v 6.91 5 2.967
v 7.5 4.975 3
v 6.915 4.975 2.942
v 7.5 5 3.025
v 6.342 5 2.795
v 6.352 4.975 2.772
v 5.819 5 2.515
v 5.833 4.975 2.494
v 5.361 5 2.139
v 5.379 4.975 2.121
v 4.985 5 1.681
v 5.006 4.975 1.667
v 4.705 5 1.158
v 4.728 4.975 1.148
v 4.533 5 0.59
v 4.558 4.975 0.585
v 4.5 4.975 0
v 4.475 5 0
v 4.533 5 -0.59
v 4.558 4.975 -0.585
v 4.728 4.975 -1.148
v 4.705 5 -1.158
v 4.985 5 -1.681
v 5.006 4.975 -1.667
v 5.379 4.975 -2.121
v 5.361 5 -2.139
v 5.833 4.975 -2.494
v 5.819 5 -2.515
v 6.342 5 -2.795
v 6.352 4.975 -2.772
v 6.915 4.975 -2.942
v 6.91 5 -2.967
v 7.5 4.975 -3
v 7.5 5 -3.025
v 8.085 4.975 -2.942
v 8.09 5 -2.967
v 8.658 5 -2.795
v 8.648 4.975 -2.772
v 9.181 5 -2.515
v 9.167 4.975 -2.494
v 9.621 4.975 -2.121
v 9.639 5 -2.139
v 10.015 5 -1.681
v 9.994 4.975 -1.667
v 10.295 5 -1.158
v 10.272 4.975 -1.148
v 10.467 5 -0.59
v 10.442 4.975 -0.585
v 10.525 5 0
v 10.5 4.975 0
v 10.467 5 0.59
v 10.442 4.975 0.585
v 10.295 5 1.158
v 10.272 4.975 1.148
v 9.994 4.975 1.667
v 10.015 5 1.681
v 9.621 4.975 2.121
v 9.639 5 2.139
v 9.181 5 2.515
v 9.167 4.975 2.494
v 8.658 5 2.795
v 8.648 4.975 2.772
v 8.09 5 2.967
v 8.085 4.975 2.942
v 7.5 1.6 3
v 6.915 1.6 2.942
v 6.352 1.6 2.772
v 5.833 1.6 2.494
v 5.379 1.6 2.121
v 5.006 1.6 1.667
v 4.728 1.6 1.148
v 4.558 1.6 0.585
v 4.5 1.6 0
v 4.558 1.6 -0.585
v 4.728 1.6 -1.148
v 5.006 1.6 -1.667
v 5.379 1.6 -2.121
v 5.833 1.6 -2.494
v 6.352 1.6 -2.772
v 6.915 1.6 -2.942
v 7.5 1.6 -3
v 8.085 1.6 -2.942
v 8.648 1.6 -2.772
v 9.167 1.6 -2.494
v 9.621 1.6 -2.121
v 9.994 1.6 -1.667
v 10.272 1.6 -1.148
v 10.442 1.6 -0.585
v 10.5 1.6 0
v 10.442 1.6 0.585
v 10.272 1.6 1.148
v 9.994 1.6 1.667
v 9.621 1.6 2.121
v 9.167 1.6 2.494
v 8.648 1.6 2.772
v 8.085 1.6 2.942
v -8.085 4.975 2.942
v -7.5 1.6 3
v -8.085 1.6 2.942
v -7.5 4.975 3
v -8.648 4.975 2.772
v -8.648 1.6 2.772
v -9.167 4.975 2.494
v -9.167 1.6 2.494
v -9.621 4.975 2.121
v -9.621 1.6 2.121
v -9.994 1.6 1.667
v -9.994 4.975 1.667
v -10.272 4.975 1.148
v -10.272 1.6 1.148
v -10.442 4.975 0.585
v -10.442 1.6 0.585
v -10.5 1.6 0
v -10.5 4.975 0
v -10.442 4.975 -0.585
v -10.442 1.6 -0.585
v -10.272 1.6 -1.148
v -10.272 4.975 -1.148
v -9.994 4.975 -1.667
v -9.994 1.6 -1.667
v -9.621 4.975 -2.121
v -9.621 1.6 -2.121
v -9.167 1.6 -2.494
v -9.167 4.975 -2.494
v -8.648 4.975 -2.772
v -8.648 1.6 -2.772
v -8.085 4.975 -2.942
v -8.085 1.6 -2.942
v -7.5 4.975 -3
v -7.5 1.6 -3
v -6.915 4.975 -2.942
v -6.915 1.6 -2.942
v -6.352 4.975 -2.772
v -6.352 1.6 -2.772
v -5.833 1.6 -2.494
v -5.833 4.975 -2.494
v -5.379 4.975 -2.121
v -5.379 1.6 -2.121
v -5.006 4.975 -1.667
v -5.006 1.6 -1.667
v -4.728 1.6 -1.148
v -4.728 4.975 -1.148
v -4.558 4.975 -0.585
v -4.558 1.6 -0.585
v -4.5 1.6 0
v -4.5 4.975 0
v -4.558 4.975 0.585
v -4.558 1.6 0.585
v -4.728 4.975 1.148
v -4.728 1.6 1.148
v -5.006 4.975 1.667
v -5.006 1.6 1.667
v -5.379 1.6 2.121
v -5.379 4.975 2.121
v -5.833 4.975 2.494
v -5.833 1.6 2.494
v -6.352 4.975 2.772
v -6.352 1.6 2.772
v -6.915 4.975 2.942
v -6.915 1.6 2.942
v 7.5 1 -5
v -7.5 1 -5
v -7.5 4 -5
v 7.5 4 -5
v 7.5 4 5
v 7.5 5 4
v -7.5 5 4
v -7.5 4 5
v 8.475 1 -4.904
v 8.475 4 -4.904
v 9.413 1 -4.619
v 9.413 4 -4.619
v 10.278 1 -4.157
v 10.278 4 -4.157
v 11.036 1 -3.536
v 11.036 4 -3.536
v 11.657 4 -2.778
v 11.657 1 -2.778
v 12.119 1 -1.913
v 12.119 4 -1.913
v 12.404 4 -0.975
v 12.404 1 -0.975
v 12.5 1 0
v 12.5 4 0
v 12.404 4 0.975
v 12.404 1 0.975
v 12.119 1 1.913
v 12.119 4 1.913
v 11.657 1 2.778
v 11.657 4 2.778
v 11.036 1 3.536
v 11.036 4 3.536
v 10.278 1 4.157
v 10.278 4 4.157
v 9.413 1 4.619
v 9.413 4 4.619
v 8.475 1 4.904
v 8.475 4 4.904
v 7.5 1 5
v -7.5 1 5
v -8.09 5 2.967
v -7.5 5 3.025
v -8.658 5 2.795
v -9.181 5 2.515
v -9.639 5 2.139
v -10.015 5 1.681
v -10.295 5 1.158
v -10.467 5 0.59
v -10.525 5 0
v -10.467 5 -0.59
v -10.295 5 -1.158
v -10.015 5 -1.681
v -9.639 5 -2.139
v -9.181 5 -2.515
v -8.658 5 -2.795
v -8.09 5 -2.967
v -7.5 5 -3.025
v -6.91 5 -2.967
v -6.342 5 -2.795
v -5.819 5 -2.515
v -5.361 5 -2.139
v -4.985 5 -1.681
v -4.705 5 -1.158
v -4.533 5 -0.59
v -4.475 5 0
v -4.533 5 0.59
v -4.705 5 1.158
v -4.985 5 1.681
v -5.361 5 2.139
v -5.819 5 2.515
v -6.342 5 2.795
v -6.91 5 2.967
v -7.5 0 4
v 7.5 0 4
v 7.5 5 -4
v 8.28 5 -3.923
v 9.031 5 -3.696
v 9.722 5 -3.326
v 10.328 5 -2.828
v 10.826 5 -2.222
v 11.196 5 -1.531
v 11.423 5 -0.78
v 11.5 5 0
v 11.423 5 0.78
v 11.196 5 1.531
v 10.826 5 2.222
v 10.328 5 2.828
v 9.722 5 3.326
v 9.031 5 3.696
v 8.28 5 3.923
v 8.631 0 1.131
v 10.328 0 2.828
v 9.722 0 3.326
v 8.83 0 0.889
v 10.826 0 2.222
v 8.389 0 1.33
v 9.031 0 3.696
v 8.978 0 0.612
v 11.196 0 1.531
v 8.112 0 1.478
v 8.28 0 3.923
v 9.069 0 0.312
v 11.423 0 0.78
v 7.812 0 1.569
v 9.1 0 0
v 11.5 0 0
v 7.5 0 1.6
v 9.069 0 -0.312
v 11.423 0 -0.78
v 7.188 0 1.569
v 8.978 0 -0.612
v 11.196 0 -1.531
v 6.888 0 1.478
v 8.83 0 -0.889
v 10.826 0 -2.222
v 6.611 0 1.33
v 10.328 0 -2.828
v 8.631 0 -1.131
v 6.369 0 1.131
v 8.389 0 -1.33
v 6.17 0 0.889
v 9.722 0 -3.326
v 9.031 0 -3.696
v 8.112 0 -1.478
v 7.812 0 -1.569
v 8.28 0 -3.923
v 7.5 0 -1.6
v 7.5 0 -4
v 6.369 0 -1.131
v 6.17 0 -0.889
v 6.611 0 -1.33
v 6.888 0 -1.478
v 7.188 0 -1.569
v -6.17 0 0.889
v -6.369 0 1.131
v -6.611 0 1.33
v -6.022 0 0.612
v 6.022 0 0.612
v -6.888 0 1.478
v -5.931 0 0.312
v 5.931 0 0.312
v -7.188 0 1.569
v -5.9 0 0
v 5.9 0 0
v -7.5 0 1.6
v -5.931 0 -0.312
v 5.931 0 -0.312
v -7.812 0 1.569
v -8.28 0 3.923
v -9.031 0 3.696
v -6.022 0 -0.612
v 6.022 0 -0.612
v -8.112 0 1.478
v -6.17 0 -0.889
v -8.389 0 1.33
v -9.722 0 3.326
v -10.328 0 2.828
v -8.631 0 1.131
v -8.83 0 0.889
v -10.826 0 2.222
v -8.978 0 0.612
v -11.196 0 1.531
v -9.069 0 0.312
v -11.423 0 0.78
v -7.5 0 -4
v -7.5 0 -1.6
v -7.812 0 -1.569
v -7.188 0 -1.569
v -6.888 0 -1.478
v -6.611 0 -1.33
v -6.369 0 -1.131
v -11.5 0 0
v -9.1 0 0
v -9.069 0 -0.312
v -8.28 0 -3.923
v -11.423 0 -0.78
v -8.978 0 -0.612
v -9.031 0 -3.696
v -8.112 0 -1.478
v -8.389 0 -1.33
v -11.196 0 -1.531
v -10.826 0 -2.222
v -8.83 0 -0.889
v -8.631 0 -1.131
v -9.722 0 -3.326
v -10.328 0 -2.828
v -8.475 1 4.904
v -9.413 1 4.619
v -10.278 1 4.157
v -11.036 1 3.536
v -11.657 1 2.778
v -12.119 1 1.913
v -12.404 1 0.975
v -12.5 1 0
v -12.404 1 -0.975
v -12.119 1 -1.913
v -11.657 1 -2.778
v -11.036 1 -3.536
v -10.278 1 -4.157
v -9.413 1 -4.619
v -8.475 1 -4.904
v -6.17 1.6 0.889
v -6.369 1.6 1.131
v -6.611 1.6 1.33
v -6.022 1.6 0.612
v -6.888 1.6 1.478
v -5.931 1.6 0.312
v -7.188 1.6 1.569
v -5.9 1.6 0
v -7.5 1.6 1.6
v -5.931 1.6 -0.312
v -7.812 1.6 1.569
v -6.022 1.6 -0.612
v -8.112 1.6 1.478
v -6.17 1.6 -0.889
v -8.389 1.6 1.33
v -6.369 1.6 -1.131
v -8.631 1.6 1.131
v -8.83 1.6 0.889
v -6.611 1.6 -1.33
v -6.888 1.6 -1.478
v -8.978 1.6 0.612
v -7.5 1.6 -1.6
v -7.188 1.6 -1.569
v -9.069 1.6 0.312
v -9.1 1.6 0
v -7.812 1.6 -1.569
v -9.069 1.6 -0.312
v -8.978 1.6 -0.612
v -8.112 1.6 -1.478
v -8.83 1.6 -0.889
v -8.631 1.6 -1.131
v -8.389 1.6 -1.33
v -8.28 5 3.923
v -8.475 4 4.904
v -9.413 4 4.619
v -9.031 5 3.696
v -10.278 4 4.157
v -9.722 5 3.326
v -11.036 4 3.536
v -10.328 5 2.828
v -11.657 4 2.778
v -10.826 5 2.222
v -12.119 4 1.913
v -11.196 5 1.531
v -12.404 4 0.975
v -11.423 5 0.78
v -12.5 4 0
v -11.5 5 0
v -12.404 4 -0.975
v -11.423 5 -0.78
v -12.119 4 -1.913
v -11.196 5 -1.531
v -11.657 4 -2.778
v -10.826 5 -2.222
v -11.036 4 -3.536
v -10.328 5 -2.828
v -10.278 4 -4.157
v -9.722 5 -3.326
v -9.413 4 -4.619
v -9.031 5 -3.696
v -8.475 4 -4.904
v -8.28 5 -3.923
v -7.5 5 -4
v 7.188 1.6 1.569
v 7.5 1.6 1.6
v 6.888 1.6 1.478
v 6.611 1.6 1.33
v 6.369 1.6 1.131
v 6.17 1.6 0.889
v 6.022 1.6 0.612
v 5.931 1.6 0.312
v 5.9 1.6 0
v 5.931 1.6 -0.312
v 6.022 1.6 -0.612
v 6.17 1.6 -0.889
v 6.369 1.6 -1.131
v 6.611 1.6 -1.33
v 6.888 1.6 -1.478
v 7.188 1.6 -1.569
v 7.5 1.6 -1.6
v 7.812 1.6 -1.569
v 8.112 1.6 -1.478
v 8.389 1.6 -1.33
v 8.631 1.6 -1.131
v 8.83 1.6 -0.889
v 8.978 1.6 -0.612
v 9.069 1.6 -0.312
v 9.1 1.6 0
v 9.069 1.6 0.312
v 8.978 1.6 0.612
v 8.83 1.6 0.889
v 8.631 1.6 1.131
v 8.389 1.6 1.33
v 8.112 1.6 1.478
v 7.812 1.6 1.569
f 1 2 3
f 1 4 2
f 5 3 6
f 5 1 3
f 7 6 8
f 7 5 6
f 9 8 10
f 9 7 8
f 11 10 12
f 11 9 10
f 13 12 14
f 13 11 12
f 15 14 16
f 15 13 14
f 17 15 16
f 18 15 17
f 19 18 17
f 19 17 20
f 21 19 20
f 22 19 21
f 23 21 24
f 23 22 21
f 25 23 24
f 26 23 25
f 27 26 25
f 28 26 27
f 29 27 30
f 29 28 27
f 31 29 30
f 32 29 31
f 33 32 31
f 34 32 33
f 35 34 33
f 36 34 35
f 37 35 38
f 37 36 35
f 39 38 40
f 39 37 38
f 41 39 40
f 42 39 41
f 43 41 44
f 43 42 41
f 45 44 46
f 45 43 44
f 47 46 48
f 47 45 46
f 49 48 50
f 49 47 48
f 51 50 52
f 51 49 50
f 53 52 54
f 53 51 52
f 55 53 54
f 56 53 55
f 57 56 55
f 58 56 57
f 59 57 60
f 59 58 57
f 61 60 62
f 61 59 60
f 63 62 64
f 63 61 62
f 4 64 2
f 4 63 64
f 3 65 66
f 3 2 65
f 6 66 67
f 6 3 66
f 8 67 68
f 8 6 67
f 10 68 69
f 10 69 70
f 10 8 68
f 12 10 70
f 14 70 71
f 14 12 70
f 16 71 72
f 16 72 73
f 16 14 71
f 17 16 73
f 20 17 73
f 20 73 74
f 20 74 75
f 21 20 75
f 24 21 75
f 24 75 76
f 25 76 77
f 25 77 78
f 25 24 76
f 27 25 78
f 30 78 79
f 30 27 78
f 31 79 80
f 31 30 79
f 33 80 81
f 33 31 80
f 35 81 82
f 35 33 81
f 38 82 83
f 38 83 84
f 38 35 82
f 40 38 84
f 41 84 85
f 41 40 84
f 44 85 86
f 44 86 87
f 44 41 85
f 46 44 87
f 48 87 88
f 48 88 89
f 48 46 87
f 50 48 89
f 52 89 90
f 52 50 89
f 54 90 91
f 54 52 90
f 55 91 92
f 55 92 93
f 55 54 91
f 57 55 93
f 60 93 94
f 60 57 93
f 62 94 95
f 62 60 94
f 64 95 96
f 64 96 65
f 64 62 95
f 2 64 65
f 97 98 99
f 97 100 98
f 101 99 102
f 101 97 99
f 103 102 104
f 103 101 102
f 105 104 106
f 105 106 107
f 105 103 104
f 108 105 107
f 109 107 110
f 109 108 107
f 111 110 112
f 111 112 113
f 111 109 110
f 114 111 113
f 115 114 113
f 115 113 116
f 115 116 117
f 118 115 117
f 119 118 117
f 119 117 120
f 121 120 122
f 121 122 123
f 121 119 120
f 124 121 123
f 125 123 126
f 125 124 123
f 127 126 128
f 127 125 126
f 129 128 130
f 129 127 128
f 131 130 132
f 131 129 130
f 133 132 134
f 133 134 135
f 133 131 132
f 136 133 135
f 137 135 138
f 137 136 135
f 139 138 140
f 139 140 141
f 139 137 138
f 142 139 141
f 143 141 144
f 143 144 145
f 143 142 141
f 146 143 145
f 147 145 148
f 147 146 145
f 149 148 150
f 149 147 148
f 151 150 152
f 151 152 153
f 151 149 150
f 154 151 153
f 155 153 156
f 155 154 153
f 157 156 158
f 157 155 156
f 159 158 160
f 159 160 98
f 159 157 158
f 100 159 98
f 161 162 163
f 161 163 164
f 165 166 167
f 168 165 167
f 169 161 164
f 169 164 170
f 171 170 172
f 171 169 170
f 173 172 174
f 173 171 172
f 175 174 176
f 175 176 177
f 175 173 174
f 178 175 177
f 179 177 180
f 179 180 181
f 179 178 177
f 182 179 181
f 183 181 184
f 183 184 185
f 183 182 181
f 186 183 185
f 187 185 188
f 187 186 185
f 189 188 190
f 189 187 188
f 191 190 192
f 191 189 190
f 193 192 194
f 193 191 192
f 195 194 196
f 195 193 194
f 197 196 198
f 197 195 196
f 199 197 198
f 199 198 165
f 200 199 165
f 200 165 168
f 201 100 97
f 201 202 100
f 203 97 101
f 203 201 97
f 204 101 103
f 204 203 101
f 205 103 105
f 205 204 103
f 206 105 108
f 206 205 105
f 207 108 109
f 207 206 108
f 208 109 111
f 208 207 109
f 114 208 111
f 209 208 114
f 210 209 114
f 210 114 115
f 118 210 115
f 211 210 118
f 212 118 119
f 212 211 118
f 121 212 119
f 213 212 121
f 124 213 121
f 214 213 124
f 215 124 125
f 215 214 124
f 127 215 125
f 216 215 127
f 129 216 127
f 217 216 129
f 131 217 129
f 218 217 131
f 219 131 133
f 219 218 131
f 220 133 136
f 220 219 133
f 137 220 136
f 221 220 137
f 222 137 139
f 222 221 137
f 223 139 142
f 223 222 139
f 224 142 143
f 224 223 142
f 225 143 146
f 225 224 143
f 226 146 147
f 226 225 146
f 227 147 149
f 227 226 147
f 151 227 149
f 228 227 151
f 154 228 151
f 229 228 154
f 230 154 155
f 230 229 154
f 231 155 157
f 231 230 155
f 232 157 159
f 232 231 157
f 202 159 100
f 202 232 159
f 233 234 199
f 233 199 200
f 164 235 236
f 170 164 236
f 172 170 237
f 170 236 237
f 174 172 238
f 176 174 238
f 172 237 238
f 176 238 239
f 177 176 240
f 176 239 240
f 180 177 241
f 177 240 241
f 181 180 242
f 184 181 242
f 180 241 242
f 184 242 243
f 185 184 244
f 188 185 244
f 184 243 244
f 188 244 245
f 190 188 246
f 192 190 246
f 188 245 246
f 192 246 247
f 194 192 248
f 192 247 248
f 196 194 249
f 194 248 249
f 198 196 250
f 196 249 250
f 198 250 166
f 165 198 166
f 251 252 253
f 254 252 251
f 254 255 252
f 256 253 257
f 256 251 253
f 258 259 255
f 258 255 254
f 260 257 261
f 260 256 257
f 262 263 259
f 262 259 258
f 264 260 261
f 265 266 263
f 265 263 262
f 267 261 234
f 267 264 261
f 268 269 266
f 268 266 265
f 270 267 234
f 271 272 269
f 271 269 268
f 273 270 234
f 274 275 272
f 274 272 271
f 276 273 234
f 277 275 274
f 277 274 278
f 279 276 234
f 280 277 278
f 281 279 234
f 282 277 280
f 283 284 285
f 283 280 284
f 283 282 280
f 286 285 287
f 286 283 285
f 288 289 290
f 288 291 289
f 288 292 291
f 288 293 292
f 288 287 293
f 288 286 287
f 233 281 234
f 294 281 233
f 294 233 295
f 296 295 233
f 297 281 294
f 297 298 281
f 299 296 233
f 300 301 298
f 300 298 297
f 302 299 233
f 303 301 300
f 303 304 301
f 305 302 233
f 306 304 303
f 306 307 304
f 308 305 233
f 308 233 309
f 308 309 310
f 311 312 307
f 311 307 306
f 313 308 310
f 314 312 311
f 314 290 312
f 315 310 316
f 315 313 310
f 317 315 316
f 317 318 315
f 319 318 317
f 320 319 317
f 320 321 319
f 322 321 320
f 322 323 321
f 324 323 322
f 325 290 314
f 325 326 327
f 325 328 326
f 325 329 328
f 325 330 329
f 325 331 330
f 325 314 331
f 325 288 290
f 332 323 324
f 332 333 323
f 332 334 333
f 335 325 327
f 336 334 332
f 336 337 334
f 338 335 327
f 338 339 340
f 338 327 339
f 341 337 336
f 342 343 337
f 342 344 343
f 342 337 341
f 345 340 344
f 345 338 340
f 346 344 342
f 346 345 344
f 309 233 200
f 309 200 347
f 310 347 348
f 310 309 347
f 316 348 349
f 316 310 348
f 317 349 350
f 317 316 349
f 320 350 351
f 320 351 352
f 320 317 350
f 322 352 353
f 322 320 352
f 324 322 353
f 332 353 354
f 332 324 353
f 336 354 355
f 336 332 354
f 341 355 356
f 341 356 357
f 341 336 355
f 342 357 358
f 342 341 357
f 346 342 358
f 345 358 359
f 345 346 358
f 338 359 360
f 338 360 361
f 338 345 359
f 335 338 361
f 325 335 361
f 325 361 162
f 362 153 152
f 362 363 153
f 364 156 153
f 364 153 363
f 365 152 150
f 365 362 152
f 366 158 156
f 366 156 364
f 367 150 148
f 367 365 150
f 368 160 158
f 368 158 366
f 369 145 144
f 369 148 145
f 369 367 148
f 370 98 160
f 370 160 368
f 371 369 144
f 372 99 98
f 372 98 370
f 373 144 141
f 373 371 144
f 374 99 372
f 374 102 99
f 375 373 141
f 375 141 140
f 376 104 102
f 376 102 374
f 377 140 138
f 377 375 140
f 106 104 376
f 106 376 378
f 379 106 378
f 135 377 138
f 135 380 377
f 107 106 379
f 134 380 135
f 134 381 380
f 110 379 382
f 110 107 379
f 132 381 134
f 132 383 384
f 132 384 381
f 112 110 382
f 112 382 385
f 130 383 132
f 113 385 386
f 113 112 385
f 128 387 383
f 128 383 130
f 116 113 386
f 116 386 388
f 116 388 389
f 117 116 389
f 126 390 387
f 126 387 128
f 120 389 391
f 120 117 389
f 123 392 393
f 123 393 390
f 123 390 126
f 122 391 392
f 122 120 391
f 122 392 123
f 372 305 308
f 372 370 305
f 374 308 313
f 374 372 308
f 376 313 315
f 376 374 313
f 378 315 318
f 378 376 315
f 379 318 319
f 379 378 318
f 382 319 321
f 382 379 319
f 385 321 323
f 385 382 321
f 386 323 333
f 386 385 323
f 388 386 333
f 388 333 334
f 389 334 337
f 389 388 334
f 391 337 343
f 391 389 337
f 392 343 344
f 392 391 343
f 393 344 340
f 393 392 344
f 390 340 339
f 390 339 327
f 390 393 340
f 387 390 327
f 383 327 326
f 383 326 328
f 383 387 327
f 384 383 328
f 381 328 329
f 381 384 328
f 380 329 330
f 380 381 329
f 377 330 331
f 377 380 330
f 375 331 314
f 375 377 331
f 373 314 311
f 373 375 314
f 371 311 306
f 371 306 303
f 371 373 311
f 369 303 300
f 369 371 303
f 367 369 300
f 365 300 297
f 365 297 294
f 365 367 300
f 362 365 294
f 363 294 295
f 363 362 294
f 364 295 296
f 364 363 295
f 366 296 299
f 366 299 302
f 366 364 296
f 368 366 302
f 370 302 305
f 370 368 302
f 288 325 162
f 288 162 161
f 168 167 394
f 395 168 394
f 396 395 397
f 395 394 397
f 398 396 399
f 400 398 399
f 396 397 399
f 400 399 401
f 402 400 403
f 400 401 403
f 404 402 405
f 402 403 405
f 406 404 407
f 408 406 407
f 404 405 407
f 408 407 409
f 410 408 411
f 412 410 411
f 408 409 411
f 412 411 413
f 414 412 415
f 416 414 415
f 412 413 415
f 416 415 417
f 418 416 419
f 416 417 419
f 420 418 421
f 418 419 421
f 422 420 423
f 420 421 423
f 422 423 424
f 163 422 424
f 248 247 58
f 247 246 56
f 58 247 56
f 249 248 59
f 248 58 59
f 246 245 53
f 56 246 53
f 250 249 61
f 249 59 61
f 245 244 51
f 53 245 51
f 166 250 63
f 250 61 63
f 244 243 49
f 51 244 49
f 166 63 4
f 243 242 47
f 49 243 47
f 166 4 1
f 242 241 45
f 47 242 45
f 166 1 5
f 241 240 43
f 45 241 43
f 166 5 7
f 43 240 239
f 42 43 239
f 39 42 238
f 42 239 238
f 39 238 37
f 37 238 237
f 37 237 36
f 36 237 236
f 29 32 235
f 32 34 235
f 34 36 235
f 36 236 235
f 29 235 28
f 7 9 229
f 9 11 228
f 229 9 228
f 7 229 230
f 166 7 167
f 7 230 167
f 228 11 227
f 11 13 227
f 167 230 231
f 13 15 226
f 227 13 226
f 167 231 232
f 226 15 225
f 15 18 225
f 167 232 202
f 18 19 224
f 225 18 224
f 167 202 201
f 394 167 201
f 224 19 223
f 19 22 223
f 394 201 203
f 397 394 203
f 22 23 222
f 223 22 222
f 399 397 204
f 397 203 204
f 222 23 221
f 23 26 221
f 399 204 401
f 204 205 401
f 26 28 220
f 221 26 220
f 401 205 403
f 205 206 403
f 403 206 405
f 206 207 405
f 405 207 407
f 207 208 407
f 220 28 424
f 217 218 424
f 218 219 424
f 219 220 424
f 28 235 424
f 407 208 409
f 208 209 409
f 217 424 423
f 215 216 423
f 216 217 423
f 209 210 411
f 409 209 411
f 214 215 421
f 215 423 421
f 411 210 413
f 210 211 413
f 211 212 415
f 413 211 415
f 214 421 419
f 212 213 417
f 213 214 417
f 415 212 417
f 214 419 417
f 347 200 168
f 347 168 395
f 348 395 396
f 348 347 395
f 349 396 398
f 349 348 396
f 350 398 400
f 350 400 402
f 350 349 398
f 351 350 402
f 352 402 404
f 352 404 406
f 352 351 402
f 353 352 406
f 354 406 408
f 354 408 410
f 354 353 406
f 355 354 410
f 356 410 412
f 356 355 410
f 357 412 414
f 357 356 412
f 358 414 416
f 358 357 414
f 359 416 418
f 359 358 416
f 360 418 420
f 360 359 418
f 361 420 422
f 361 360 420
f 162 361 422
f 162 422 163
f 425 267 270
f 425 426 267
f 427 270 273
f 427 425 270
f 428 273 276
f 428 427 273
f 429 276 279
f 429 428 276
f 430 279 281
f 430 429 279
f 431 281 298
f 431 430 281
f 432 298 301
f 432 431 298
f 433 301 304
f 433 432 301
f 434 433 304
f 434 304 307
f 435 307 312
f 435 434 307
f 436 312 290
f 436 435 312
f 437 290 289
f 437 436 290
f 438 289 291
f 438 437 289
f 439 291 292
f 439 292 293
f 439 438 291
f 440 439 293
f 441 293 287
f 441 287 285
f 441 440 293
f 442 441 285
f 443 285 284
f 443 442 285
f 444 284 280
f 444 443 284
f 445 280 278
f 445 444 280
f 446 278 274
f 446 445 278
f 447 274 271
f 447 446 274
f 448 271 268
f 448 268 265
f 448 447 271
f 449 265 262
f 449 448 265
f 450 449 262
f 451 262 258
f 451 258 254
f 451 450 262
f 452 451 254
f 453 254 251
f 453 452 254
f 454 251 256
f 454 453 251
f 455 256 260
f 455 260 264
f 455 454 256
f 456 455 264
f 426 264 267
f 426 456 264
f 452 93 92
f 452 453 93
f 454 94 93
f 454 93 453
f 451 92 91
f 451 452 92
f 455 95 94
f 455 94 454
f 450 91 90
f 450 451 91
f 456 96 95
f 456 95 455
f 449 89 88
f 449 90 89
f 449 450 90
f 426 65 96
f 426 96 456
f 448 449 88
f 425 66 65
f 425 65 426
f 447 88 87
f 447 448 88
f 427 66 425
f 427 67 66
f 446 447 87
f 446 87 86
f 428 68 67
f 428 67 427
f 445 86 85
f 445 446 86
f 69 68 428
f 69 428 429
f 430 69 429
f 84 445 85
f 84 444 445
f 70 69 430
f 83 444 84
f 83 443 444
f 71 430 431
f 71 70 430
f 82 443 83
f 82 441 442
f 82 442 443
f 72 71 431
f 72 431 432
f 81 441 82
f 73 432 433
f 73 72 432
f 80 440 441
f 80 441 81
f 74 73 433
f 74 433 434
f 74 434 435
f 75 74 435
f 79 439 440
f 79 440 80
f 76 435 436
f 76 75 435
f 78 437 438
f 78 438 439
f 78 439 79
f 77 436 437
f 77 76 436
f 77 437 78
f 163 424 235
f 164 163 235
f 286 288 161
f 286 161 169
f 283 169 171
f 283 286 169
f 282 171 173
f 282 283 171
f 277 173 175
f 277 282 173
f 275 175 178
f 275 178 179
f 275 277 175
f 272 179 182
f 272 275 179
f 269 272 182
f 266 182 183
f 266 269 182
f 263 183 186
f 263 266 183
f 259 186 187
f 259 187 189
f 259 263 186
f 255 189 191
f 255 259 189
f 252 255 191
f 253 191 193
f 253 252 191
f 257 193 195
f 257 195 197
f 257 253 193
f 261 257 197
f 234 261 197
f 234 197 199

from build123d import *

# Parameters (mm, degrees)
BOSS_EXTRUDE1_DEPTH                          = 5
CBORE_FOR_M3_HEXAGON_SOCKET_HEAD_CAP_2_COUNT = 2
CBORE_FOR_M3_HEXAGON_SOCKET_HEAD_CAP_2_PITCH = 15
CHAMFER1_SIZE                                = 1


with BuildPart() as part:
    # Sketch1 → Boss-Extrude1 (new body)
    with BuildSketch(Plane(origin=(0, 0, 0), x_dir=(1, 0, 0), z_dir=(0, 1, 0))):
        with BuildLine():
            Line((-7.5, 5), (7.5, 5))
            ThreePointArc((7.5, 5), (12.5, 0), (7.5, -5))
            Line((7.5, -5), (-7.5, -5))
            ThreePointArc((-7.5, -5), (-12.5, 0), (-7.5, 5))
        make_face()
    extrude(amount=BOSS_EXTRUDE1_DEPTH)

    # Sketch3 → CBORE for M3 Hexagon socket head cap screws1 (revolve, cut)
    with BuildSketch(Plane(origin=(-7.5, 5, 0), x_dir=(0, 0, 1), z_dir=(1, 0, 0))):
        Polygon((0, 0), (0, 5), (1.6, 5), (1.6, 3.4), (3, 3.4), (3, 0.025), (3.025, 0), align=None)
    cbore_for_m3_hexagon_socket_head_cap_scr = revolve(axis=Axis((-7.5, 11.35, 0), (0, -1, 0)), mode=Mode.SUBTRACT)

    # CBORE for M3 Hexagon socket head cap 2: CBORE for M3 Hexagon socket head cap screws1 ×2
    with Locations(*[(i * CBORE_FOR_M3_HEXAGON_SOCKET_HEAD_CAP_2_PITCH, 0, 0) for i in range(1, CBORE_FOR_M3_HEXAGON_SOCKET_HEAD_CAP_2_COUNT)]):
        add(cbore_for_m3_hexagon_socket_head_cap_scr, mode=Mode.SUBTRACT)

    # Chamfer1
    chamfer1_edges = [part.edges().sort_by_distance(p)[0] for p in [
        (12.5, 5, 0),
        (0, 5, -5),
        (-12.5, 5, 0),
        (0, 0, -5),
        (12.5, 0, 0),
        (0, 0, 5),
        (-12.5, 0, 0),
        (0, 5, 5),
    ]]
    chamfer(chamfer1_edges, length=CHAMFER1_SIZE)


solid = part.part
